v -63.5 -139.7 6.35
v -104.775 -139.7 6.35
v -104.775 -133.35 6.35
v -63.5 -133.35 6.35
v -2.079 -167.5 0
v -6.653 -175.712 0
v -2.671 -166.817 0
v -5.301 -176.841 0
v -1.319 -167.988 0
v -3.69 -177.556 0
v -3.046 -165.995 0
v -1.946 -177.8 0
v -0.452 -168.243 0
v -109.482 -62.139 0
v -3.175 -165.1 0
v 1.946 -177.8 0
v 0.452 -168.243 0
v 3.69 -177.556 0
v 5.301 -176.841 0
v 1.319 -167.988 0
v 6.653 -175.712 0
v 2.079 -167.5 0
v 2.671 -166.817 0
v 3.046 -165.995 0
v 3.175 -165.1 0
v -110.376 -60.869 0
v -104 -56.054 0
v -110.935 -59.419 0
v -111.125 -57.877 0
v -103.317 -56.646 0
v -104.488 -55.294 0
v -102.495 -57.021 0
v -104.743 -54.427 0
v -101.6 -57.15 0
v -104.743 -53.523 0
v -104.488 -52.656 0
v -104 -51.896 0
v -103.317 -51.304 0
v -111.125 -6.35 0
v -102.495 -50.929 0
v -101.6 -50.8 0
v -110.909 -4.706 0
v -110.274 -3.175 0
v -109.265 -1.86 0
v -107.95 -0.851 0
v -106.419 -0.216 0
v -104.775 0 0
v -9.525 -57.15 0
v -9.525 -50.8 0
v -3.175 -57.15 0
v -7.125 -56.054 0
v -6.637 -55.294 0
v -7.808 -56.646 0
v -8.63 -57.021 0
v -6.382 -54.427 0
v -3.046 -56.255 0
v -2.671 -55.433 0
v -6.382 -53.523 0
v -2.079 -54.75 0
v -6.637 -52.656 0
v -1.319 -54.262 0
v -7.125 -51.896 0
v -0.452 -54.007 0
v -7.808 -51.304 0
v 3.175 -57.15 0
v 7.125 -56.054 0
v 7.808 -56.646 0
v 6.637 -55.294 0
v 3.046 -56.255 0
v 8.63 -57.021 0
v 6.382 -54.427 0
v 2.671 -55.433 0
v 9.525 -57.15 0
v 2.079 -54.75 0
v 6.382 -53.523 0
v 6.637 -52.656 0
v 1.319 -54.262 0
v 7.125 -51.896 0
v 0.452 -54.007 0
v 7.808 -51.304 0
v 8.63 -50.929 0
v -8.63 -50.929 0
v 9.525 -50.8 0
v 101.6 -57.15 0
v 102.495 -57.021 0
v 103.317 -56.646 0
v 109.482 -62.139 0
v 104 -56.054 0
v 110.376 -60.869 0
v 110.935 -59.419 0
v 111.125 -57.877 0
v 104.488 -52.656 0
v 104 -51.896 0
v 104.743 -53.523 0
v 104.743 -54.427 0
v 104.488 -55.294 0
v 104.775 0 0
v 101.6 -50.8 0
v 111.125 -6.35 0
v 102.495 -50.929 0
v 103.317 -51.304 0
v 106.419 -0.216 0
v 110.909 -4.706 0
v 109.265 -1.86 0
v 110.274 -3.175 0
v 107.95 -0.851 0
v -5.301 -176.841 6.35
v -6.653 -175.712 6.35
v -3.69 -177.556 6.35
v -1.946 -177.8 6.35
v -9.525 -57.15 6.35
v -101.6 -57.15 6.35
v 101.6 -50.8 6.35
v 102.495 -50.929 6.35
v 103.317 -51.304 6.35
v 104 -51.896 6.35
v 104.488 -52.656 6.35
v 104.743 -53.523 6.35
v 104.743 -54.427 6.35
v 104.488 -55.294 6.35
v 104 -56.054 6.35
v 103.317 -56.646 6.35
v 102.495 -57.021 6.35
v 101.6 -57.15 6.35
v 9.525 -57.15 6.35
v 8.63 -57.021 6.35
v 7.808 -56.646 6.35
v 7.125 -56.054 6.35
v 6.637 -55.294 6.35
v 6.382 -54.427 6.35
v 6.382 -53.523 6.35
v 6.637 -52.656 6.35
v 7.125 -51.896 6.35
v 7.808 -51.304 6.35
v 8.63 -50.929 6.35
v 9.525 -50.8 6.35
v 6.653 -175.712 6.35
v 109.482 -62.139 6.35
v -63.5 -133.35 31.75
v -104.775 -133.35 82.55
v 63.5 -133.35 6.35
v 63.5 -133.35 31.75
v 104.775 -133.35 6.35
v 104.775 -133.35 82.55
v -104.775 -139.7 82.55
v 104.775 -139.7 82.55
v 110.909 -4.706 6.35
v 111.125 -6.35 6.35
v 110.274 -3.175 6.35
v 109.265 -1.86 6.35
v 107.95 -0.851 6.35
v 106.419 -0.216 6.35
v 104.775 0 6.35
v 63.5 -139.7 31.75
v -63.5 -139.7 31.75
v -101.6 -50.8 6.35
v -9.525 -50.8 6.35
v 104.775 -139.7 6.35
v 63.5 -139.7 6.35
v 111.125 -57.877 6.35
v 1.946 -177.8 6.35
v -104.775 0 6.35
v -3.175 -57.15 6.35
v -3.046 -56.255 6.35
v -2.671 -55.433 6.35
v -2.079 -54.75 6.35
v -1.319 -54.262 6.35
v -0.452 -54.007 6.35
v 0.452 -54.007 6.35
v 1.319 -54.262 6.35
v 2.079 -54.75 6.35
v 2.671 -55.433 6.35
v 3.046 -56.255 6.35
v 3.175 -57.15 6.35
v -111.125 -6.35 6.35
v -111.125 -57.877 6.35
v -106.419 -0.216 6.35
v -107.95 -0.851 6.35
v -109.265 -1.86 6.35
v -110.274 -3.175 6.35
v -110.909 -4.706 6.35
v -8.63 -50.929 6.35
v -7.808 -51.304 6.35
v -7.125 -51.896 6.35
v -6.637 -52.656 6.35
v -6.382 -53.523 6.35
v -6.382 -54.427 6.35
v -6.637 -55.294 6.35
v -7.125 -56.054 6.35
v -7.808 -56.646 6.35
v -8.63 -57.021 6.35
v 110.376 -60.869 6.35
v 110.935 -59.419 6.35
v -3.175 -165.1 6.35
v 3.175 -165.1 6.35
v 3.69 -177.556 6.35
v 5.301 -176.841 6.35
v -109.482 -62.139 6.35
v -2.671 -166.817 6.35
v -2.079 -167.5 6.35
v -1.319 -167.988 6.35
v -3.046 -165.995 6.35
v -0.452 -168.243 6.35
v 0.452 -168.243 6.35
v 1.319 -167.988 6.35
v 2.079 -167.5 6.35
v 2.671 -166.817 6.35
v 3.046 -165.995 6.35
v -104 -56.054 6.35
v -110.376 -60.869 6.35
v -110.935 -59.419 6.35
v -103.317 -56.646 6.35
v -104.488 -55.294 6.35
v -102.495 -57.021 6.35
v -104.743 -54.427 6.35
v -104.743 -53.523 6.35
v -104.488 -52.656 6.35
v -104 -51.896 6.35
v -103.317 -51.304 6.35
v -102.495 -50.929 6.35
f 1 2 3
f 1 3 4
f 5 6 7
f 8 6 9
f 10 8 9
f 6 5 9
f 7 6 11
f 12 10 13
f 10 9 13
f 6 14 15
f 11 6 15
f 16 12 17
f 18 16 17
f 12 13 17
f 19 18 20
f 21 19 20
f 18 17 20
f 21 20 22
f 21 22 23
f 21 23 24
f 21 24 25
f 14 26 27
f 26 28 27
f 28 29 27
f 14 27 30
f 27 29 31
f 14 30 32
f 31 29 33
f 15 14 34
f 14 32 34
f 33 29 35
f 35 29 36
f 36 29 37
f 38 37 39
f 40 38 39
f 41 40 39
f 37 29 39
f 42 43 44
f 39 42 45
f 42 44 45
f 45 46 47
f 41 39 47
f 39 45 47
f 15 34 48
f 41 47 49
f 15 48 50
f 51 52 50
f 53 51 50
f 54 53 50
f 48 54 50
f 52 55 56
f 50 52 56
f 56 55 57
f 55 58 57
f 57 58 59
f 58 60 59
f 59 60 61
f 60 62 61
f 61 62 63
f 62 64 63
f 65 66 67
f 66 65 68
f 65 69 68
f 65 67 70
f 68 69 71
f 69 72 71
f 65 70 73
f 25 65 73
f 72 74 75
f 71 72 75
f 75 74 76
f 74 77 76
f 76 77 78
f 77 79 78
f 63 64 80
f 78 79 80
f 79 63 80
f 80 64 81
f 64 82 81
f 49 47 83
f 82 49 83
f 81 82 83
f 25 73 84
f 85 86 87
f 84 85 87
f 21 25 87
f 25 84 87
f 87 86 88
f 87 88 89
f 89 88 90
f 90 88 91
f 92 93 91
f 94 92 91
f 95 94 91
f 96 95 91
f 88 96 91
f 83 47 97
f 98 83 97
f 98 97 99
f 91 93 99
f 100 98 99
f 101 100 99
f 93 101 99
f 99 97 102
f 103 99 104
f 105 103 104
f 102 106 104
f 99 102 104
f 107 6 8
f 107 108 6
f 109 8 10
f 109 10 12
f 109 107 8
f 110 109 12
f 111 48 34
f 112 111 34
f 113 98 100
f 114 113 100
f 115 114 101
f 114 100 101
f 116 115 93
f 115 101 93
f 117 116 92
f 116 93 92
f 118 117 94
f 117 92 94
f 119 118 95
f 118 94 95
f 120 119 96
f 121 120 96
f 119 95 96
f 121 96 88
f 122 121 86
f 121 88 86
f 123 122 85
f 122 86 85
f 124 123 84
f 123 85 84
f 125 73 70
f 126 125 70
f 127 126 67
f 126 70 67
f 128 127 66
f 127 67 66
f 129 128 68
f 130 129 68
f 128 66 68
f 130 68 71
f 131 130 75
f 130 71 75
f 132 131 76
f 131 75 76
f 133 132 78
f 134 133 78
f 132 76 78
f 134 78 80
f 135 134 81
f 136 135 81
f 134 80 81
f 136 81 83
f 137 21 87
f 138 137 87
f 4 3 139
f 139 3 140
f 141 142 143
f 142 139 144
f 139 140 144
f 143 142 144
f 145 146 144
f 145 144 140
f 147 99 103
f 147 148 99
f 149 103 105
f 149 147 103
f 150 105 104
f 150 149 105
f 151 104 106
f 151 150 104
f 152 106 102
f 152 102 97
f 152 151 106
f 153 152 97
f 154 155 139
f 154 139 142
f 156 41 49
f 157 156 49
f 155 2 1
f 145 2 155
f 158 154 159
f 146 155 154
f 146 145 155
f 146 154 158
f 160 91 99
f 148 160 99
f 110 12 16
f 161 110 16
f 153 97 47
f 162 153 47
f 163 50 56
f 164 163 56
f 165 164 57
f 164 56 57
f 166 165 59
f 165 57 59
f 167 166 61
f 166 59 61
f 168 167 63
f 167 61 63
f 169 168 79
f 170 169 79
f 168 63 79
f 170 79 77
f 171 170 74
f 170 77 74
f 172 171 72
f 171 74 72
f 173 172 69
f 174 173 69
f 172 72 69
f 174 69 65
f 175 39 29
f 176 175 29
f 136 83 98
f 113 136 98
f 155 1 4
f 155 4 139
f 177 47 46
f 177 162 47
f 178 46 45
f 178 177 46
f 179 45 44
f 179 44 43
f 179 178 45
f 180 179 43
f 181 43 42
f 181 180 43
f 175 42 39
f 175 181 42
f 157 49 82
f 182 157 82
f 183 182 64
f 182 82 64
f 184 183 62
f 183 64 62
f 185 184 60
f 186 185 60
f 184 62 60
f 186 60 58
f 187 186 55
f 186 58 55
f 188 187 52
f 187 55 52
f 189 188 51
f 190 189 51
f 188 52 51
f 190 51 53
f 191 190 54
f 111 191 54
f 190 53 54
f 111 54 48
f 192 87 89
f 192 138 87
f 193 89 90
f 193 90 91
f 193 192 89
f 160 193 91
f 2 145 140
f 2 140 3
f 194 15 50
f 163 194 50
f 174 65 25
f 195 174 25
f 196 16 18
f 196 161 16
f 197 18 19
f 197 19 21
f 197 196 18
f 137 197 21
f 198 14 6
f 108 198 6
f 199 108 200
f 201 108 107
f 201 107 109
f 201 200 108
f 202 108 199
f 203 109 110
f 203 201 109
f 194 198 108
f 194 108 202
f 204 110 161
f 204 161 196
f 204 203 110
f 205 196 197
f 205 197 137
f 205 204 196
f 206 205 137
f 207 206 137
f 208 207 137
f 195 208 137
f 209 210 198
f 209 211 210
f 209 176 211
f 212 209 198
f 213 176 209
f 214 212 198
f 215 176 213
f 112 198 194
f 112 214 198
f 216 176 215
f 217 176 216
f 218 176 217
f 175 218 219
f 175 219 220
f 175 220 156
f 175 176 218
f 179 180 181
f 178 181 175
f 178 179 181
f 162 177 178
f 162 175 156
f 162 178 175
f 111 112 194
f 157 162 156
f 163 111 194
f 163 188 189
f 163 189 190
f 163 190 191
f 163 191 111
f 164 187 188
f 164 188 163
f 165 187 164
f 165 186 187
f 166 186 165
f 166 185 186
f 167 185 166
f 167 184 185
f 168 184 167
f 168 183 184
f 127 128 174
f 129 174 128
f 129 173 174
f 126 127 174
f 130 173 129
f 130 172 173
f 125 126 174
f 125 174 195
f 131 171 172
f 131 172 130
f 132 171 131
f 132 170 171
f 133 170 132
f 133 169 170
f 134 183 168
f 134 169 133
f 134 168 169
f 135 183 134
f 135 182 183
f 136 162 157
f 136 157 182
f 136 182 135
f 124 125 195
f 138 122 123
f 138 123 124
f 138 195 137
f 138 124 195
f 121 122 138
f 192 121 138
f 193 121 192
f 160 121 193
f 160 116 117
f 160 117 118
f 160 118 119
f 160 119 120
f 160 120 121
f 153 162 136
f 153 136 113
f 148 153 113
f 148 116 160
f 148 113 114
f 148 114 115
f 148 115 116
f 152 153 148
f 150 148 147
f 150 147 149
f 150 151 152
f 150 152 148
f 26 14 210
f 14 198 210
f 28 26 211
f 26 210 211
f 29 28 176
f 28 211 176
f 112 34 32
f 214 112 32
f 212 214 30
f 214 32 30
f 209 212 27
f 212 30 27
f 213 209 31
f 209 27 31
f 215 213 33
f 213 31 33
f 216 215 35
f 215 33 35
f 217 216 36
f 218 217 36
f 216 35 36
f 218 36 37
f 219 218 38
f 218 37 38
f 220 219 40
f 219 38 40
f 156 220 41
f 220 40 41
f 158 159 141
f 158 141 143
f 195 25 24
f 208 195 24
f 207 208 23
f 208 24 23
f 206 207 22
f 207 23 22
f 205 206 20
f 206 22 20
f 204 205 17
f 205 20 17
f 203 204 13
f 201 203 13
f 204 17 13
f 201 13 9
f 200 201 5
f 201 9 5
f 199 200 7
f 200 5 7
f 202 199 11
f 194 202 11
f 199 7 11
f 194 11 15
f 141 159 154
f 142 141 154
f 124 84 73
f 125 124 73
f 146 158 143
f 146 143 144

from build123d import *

# Parameters (mm, degrees)
F1_DEPTH = 6.35
F3_W     = 41.275
F3_H     = 25.4
F4_DEPTH = 6.35
F5_R     = 6.35


with BuildPart() as f1:
    # F0 (on Top) → F1 (new body)
    with BuildSketch(Plane.XY):
        Polygon((-111.125, -60.325), (-4.7625, -177.8), (4.7625, -177.8), (111.125, -60.325), (111.125, 0), (-111.125, 0), align=None)
        with BuildLine():
            Line((-9.525, -57.15), (-101.6, -57.15))
            ThreePointArc((-101.6, -57.15), (-104.775, -53.975), (-101.6, -50.8))
            Line((-101.6, -50.8), (-9.525, -50.8))
            Line((-9.525, -50.8), (9.525, -50.8))
            Line((9.525, -50.8), (101.6, -50.8))
            ThreePointArc((101.6, -50.8), (104.775, -53.975), (101.6, -57.15))
            Line((101.6, -57.15), (9.525, -57.15))
            Line((9.525, -57.15), (3.175, -57.15))
            Line((3.175, -57.15), (3.175, -165.1))
            ThreePointArc((3.175, -165.1), (0, -168.275), (-3.175, -165.1))
            Line((-3.175, -165.1), (-3.175, -57.15))
            Line((-3.175, -57.15), (-9.525, -57.15))
        make_face(mode=Mode.SUBTRACT)
        with BuildLine():
            ThreePointArc((-9.525, -50.8), (-6.35, -53.975), (-9.525, -57.15))
            Line((-9.525, -57.15), (-3.175, -57.15))
            ThreePointArc((-3.175, -57.15), (0, -53.975), (3.175, -57.15))
            Line((3.175, -57.15), (9.525, -57.15))
            ThreePointArc((9.525, -57.15), (6.35, -53.975), (9.525, -50.8))
            Line((9.525, -50.8), (-9.525, -50.8))
        make_face()
    extrude(amount=F1_DEPTH)

    # F5
    f5_edges = [f1.edges().sort_by_distance(p)[0] for p in [
        (-111.125, -60.325, 3.175),
        (-111.125, 0, 3.175),
        (-4.7625, -177.8, 3.175),
        (4.7625, -177.8, 3.175),
        (111.125, 0, 3.175),
        (111.125, -60.325, 3.175),
    ]]
    fillet(f5_edges, radius=F5_R)


with BuildPart() as f4:
    # F3 (on offset) → F4 (new body)
    with BuildSketch(Plane.XZ.offset(139.7)):
        Polygon((104.775, 82.55), (-104.775, 82.55), (-104.775, 31.75), (-63.5, 31.75), (63.5, 31.75), (104.775, 31.75), align=None)
        with Locations((-84.1375, 19.05)):
            Rectangle(F3_W, F3_H)
        with Locations((84.1375, 19.05)):
            Rectangle(F3_W, F3_H)
    extrude(amount=-F4_DEPTH)


solid = Compound([f1.part, f4.part])
